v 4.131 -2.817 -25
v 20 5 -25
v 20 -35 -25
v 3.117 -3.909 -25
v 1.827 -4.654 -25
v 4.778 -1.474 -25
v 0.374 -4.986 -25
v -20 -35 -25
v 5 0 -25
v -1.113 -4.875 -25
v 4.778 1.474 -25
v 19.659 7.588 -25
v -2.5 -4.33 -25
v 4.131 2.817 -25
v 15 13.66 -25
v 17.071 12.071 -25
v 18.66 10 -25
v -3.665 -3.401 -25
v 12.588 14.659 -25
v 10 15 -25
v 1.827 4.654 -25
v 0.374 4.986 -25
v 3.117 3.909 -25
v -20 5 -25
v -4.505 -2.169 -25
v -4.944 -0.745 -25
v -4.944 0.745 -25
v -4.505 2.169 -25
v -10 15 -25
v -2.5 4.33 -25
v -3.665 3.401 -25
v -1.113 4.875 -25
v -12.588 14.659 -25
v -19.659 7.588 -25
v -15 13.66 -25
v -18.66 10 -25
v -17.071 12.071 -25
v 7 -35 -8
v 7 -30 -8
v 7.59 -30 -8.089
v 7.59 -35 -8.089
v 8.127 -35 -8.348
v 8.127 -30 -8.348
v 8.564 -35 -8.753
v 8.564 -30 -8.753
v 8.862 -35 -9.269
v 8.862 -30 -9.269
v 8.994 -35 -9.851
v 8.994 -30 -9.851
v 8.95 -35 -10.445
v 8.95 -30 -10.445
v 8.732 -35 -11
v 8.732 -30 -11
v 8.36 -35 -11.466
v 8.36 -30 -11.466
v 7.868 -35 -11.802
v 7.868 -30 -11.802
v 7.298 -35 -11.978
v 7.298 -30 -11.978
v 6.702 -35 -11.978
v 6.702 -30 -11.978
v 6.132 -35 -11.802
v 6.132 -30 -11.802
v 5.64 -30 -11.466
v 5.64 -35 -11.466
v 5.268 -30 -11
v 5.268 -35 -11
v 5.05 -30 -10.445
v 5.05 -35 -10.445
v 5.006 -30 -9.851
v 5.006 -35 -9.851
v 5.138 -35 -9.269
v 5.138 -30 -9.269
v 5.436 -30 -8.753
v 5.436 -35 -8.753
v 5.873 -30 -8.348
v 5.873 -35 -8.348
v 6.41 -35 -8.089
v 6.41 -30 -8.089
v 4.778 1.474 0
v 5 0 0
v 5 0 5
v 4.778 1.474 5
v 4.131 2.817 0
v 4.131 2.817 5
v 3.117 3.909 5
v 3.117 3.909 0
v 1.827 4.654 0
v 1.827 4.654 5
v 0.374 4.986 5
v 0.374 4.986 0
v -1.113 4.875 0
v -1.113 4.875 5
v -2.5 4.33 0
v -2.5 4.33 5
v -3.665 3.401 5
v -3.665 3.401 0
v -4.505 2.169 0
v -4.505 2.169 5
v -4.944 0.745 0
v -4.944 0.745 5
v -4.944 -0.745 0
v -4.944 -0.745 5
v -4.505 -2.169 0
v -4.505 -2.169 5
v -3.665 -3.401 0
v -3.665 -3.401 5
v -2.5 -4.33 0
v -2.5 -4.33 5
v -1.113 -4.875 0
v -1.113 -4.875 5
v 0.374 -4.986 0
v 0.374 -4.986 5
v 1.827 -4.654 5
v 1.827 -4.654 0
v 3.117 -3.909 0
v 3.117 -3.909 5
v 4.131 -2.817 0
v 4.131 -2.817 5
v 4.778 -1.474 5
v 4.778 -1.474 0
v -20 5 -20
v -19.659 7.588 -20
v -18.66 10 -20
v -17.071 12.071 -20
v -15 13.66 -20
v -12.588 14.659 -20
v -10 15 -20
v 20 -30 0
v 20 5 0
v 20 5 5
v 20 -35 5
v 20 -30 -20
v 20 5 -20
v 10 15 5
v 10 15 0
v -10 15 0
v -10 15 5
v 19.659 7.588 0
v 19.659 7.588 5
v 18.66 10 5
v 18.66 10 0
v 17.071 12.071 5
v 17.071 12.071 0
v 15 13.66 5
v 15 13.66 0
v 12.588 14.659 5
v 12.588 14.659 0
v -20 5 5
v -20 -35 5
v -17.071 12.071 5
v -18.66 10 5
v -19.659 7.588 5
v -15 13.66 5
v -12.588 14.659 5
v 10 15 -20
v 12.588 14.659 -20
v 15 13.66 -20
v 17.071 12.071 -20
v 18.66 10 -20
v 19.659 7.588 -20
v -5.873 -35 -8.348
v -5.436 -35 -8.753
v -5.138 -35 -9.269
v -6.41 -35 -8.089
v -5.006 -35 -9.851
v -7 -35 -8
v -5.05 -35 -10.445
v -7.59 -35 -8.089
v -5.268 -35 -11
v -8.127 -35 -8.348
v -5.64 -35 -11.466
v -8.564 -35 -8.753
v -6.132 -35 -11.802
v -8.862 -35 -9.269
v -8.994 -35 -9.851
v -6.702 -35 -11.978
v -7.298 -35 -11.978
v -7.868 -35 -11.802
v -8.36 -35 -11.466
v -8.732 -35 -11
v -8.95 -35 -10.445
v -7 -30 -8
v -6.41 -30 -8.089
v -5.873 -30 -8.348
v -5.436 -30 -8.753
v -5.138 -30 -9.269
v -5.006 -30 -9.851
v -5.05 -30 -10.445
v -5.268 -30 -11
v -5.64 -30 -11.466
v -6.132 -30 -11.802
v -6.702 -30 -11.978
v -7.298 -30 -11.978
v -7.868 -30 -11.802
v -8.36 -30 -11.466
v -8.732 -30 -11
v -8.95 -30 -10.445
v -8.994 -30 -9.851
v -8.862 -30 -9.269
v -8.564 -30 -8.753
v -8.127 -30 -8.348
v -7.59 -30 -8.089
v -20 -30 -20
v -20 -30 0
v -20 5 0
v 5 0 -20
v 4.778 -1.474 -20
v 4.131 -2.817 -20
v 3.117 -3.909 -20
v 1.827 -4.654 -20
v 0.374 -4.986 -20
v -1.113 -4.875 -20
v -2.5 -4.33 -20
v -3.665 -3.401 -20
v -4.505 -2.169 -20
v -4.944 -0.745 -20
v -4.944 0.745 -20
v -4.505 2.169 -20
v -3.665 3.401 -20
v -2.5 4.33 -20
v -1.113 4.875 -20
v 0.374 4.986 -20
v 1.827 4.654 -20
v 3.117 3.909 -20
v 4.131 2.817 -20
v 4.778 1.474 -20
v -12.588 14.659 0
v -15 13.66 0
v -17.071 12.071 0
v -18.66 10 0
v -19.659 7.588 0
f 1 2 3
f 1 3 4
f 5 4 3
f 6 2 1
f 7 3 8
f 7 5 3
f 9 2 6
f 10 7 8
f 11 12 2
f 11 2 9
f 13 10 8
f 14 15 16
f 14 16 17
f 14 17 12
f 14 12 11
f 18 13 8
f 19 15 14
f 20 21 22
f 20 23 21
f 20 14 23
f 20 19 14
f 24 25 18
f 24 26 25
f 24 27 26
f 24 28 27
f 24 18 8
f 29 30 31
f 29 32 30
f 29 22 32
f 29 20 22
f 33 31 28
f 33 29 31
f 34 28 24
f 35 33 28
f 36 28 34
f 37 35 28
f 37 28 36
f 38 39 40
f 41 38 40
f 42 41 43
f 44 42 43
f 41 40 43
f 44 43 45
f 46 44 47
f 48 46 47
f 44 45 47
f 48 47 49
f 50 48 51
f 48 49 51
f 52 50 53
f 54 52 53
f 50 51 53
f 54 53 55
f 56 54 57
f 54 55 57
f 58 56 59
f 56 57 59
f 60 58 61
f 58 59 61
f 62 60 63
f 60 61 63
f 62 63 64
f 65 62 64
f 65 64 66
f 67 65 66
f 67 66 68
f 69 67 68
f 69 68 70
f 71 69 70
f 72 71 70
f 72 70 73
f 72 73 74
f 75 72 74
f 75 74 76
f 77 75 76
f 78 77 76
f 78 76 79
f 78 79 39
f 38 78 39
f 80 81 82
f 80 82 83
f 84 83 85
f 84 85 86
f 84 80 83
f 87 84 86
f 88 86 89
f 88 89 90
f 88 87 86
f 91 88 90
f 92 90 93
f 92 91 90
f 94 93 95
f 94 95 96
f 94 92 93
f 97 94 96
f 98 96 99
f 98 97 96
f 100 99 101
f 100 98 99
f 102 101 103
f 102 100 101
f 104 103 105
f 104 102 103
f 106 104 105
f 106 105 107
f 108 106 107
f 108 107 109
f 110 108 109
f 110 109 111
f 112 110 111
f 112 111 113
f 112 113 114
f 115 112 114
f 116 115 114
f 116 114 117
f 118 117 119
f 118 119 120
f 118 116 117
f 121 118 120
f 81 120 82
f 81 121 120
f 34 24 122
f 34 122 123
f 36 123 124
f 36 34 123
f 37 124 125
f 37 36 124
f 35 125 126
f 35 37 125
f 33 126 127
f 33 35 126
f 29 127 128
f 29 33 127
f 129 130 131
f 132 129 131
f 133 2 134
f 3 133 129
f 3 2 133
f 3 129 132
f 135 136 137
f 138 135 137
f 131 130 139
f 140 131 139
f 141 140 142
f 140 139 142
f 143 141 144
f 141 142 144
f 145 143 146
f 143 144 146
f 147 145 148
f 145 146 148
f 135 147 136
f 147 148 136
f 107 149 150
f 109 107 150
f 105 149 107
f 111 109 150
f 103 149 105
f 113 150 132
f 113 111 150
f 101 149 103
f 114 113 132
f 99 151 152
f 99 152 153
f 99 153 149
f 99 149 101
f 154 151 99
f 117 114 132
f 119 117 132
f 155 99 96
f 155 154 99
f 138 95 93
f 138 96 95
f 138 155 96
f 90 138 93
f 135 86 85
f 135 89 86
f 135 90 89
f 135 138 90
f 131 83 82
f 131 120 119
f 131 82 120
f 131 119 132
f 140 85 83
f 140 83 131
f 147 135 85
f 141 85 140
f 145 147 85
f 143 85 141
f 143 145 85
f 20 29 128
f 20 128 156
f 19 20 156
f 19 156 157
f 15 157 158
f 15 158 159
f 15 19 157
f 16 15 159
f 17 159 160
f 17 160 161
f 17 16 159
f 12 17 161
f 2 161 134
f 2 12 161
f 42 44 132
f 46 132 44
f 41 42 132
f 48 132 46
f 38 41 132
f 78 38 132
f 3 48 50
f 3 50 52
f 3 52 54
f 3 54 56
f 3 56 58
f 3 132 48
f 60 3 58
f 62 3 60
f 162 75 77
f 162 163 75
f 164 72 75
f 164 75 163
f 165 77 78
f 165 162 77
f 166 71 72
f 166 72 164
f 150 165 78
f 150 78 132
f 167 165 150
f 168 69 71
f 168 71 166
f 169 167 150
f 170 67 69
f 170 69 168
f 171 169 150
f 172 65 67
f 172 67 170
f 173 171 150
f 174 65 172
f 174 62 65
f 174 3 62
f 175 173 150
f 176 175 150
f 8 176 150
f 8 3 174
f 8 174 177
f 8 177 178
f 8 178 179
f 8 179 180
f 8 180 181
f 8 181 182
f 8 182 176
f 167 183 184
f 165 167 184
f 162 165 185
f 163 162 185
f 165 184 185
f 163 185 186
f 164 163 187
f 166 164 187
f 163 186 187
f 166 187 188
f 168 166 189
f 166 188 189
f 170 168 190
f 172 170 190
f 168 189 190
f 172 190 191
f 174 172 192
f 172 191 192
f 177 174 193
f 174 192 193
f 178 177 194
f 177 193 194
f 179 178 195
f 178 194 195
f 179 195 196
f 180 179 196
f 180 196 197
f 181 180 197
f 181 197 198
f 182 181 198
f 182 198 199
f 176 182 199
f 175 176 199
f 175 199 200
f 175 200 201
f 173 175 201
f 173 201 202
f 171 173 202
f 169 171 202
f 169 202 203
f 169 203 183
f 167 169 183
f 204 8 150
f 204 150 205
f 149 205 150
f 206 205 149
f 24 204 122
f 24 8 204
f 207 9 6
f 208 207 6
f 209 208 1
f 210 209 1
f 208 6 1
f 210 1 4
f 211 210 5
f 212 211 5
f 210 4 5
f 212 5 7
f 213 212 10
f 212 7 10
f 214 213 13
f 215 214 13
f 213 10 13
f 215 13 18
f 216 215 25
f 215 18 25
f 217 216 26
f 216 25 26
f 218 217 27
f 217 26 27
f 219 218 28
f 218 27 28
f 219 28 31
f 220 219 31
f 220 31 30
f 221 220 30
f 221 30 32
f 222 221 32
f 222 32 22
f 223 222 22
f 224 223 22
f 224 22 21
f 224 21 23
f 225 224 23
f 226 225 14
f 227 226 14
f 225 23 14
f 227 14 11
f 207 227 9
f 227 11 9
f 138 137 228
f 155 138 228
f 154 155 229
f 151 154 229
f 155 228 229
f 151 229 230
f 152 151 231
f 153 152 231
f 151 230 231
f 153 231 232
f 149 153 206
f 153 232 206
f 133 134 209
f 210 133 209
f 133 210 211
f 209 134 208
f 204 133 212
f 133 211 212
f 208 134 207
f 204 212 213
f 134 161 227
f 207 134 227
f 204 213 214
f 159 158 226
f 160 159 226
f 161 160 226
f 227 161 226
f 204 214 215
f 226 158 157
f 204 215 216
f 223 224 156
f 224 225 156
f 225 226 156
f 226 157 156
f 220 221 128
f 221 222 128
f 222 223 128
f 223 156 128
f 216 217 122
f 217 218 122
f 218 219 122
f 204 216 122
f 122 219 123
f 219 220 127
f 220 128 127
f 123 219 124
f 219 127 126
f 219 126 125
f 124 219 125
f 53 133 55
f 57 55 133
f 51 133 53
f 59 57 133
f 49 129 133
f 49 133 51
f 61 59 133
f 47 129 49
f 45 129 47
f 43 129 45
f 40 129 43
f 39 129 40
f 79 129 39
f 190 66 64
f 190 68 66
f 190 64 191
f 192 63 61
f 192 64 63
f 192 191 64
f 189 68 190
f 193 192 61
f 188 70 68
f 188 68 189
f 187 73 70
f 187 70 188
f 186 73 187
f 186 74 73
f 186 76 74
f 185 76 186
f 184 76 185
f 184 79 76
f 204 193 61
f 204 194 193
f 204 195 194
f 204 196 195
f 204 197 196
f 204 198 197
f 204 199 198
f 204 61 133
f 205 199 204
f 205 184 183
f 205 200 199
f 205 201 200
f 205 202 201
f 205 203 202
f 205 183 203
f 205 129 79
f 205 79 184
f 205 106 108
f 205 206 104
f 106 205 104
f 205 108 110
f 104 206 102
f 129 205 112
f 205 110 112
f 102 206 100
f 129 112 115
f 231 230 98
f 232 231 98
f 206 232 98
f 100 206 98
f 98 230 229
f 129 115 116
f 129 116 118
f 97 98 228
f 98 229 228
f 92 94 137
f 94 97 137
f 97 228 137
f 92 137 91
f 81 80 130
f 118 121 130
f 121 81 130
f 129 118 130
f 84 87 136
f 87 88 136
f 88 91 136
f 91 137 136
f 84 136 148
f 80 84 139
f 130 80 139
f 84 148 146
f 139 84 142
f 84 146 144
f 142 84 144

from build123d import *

# Parameters (mm, degrees)
SKETCH1_R           = 5
BOSS_EXTRUDE4_DEPTH = 5
SKETCH4_W           = 40
SKETCH4_H           = 5
BOSS_EXTRUDE5_DEPTH = 20
BOSS_EXTRUDE6_START = 5
SKETCH5_R           = 5
BOSS_EXTRUDE6_DEPTH = 5
SKETCH7_R           = 2
CUT_EXTRUDE1_DEPTH  = 15


with BuildPart() as part:
    # Sketch1 → Boss-Extrude4 (new body)
    with BuildSketch(Plane.XY):
        with BuildLine():
            Line((-20, -35), (20, -35))
            Line((20, -35), (20, 5))
            ThreePointArc((20, 5), (17.071067812, 12.071067812), (10, 15))
            Line((10, 15), (-10, 15))
            ThreePointArc((-10, 15), (-17.071067812, 12.071067812), (-20, 5))
            Line((-20, 5), (-20, -35))
        make_face()
        Circle(SKETCH1_R, mode=Mode.SUBTRACT)
    extrude(amount=BOSS_EXTRUDE4_DEPTH)

    # Sketch4 → Boss-Extrude5 (add)
    with BuildSketch(Plane(origin=(0, 0, 0), x_dir=(-1, 0, 0), z_dir=(0, 0, -1))):
        with Locations((0, -32.5)):
            Rectangle(SKETCH4_W, SKETCH4_H)
    extrude(amount=BOSS_EXTRUDE5_DEPTH)

    # Sketch5 → Boss-Extrude6 (add)
    with BuildSketch(Plane(origin=(0, 0, -20), x_dir=(-1, 0, 0), z_dir=(0, 0, -1)).offset(BOSS_EXTRUDE6_START)):
        with BuildLine():
            Line((-20, 5), (-20, -35))
            Line((-20, -35), (20, -35))
            Line((20, -35), (20, -30))
            Line((20, -30), (20, 5))
            ThreePointArc((20, 5), (17.071067812, 12.071067812), (10, 15))
            Line((10, 15), (-10, 15))
            ThreePointArc((-10, 15), (-17.071067812, 12.071067812), (-20, 5))
        make_face()
        with Locations(Location((0, 0, 0), (0, 0, 180))):
            Circle(SKETCH5_R, mode=Mode.SUBTRACT)
    extrude(amount=-BOSS_EXTRUDE6_DEPTH)

    # Sketch7 → Cut-Extrude1 (cut)
    with BuildSketch(Plane(origin=(0, -30, 0), x_dir=(1, 0, 0), z_dir=(0, 1, 0))):
        with Locations(Location((-7, 10, 0), (0, 0, 270))):
            Circle(SKETCH7_R)
        with Locations(Location((7, 10, 0), (0, 0, 270))):
            Circle(SKETCH7_R)
    extrude(amount=-CUT_EXTRUDE1_DEPTH, mode=Mode.SUBTRACT)


solid = part.part
